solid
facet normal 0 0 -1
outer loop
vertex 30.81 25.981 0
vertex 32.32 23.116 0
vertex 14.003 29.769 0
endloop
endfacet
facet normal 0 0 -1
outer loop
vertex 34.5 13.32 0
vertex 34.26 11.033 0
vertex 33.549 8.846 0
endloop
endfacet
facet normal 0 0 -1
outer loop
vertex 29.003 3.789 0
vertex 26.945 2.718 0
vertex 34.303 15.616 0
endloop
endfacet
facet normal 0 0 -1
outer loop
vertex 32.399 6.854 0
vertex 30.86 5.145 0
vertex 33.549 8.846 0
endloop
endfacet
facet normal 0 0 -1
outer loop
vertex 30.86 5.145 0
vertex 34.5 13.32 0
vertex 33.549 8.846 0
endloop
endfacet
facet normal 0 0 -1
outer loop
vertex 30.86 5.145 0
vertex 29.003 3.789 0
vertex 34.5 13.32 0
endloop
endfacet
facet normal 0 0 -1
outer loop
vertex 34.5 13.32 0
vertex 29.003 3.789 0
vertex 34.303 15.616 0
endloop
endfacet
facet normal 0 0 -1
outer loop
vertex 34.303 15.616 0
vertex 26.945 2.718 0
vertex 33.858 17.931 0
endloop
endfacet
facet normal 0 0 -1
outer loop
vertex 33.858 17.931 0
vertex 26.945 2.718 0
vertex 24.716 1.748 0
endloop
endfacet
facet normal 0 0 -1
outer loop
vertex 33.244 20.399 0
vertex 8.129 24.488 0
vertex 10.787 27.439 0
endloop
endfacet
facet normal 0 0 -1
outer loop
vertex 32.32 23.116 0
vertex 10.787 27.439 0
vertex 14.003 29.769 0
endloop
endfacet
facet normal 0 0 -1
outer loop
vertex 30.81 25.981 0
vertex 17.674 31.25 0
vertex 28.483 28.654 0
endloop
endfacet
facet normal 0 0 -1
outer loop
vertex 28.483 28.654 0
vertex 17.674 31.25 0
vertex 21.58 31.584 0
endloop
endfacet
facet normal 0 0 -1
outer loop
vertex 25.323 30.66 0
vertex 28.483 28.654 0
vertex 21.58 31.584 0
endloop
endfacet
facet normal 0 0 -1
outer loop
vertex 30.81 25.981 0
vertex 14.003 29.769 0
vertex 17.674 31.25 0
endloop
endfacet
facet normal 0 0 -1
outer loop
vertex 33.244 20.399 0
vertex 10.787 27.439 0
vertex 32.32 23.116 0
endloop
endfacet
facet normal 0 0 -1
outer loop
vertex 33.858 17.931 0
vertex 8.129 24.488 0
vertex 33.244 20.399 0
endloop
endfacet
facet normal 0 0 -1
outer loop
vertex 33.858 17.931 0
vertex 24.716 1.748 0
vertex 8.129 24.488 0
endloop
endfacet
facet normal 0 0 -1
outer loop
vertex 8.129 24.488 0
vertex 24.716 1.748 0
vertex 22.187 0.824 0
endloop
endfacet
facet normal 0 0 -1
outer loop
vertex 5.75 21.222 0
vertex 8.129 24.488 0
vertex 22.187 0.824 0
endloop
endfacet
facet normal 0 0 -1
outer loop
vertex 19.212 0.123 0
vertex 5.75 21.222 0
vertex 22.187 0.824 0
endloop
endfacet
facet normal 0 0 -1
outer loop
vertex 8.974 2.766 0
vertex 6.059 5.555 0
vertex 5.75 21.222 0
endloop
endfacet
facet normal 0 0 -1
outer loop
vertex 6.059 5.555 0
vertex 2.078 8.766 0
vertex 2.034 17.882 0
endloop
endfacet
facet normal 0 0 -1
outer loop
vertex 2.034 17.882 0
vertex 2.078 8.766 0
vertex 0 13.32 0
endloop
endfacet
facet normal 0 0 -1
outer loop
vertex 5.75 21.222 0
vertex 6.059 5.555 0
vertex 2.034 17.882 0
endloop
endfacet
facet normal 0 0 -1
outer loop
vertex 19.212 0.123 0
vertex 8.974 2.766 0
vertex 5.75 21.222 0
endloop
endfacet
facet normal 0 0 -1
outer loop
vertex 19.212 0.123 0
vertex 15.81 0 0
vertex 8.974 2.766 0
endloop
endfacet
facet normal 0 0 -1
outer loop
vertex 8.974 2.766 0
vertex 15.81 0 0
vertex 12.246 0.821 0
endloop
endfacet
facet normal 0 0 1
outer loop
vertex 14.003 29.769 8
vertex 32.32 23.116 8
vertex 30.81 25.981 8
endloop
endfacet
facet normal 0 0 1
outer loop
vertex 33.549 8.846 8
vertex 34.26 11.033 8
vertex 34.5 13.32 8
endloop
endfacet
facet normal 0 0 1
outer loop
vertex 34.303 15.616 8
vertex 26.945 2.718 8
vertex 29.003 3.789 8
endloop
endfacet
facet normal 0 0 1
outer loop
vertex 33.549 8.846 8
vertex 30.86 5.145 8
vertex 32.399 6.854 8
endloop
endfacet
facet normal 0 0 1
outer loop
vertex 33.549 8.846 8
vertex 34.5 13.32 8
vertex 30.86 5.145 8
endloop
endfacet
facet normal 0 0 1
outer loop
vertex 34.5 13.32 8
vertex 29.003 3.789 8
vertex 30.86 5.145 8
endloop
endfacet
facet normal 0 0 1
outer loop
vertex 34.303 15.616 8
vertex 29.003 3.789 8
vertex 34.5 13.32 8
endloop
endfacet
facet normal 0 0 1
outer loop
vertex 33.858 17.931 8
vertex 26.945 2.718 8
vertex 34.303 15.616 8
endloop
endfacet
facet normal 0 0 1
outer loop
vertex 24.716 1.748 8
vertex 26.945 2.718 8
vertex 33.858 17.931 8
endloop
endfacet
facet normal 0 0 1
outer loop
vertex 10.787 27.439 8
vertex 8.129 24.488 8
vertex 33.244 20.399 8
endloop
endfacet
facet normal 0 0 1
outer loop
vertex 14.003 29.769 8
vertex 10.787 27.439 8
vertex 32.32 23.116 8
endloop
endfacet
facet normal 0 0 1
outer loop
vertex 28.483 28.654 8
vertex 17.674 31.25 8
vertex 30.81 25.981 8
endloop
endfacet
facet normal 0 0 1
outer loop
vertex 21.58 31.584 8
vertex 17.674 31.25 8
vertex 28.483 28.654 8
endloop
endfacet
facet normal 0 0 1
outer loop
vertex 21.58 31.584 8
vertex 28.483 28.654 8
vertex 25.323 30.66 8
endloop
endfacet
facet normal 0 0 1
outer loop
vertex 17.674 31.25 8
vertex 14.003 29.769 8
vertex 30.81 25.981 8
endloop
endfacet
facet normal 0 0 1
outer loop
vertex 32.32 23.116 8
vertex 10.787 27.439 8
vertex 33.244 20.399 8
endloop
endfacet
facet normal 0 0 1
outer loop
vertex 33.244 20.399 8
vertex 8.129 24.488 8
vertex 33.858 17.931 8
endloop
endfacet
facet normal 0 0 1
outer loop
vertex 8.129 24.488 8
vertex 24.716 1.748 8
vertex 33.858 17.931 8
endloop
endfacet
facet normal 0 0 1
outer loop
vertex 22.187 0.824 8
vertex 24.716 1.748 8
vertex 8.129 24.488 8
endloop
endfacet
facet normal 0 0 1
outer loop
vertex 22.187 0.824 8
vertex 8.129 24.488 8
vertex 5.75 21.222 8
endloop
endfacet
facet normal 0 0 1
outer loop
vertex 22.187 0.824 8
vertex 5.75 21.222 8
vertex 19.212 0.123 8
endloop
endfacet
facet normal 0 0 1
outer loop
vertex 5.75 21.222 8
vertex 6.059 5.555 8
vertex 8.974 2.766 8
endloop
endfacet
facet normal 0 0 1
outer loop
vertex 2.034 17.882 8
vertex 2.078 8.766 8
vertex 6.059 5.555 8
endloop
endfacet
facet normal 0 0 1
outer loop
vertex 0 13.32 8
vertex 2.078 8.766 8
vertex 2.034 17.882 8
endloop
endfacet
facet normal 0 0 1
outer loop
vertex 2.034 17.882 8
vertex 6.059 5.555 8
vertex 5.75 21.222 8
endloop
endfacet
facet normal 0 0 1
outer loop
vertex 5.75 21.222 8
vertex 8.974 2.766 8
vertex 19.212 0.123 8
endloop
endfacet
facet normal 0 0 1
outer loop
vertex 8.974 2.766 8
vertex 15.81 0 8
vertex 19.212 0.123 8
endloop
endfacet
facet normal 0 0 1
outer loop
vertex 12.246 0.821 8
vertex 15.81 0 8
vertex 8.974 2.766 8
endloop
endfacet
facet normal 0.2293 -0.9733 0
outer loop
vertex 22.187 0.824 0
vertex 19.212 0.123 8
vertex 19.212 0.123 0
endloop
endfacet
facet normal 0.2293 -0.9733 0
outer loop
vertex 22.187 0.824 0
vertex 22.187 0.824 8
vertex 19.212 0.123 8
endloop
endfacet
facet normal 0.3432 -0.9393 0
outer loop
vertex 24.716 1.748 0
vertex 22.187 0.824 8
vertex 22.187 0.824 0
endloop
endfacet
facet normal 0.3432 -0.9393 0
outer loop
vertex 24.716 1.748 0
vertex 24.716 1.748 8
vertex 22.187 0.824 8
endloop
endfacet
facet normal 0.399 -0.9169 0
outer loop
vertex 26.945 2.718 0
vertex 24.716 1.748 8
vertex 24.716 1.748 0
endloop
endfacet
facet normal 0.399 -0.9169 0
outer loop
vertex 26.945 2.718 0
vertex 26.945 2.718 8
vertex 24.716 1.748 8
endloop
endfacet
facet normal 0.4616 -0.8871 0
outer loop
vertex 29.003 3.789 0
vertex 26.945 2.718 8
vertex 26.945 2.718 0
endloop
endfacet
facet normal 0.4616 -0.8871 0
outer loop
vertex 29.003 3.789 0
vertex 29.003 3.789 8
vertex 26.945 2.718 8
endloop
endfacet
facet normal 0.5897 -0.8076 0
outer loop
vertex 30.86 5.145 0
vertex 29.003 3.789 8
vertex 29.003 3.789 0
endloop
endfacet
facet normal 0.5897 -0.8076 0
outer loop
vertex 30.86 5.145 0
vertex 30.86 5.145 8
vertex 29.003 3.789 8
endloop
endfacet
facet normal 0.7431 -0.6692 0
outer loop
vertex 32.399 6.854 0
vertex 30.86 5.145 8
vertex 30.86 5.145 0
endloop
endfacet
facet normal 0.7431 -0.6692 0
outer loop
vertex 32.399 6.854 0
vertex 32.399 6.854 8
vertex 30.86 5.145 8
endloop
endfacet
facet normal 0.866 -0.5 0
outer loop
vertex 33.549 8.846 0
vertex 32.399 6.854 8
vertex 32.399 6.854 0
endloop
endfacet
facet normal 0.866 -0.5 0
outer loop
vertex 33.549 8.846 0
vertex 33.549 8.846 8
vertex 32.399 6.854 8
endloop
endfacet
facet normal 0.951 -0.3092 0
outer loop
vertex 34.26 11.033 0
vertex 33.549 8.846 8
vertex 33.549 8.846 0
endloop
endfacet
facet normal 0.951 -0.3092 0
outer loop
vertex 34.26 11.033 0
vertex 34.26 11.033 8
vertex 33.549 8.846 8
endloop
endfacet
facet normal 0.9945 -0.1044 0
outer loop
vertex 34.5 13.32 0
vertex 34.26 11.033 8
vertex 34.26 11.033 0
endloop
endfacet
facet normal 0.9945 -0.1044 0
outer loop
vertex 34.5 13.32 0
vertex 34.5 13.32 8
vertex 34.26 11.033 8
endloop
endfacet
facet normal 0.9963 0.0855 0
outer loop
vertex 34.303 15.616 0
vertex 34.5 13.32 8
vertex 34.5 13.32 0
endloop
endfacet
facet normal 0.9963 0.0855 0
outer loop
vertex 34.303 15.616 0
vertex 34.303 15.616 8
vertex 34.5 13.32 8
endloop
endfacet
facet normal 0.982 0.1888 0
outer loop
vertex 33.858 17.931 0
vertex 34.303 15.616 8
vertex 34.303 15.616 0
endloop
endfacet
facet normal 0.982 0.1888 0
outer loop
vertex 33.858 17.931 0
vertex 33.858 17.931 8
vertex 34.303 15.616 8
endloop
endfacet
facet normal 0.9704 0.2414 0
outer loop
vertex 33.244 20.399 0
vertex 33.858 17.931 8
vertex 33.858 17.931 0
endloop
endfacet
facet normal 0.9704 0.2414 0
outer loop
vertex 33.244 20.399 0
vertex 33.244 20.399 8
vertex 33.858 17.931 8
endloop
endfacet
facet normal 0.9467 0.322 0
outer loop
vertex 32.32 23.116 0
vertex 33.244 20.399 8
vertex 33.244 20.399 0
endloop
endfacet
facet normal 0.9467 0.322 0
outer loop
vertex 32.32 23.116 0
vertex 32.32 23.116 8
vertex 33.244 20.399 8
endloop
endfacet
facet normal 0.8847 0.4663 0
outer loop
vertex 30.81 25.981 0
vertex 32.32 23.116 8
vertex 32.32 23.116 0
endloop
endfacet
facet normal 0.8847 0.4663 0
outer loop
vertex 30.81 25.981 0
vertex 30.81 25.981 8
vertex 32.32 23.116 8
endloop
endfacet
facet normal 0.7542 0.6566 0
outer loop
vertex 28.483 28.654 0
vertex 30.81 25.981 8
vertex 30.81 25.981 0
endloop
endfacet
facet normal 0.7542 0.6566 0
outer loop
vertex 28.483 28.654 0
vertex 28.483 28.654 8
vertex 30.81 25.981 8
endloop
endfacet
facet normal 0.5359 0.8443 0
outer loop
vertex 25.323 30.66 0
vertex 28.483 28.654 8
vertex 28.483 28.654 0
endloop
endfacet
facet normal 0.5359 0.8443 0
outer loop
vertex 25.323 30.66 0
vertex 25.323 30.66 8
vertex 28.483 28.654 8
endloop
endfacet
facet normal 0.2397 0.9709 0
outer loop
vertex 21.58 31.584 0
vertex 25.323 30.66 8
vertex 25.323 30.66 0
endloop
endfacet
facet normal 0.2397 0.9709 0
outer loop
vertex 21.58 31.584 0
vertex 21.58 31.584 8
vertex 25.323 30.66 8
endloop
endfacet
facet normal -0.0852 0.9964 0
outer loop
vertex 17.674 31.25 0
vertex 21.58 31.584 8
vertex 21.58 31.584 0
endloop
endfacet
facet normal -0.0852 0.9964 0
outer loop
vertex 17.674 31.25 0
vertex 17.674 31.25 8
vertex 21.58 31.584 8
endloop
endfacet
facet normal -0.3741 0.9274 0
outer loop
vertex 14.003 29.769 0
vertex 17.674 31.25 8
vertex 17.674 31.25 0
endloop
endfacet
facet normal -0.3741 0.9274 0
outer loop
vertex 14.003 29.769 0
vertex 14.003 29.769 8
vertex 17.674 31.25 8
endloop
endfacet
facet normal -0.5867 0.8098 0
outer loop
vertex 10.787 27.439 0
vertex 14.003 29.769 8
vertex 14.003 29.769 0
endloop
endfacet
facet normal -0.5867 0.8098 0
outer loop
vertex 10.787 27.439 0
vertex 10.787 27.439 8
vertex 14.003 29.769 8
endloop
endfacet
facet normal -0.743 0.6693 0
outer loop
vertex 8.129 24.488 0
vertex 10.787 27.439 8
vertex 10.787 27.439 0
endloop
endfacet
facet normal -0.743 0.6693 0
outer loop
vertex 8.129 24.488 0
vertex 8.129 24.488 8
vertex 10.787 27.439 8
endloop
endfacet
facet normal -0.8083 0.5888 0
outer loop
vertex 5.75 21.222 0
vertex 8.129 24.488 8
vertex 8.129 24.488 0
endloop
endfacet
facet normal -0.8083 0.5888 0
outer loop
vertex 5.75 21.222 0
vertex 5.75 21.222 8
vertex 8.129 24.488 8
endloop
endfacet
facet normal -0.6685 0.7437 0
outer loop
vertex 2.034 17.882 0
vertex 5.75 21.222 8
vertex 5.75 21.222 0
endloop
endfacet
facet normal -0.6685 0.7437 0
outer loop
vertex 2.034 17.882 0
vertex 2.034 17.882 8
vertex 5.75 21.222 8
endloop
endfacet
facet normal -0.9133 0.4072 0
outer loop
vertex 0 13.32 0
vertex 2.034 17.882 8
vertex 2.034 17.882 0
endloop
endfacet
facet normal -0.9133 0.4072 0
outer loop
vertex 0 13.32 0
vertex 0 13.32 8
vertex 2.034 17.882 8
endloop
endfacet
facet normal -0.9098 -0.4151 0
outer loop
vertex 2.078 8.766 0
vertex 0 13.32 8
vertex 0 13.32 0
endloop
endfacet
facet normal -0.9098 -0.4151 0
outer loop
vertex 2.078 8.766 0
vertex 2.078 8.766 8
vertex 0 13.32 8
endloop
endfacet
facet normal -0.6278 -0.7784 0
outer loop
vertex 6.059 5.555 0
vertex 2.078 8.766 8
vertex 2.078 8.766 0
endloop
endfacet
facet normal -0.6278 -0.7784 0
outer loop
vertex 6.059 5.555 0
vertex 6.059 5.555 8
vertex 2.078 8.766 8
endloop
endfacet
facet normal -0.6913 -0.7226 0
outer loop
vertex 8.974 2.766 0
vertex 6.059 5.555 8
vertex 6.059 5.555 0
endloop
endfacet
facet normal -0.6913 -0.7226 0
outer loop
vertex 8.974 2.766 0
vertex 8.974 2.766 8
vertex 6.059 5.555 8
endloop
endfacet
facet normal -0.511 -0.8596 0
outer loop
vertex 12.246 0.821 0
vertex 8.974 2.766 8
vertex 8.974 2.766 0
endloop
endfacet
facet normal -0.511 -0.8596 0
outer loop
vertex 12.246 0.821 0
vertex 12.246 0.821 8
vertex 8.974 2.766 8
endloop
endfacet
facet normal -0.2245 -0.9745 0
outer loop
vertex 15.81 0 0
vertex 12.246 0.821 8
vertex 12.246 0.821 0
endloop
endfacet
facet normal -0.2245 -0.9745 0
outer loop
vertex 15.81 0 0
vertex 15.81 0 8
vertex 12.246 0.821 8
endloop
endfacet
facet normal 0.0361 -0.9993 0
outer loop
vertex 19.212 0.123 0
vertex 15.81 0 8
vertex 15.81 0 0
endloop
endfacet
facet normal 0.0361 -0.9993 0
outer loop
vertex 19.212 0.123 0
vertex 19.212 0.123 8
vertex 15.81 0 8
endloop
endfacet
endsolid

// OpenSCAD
$fn = 32;

// ----------------------------------------------------------------------
// Cam disc: base radius 11.0 mm, lift 8.0 mm, 30 profile points
// ----------------------------------------------------------------------

// --- parameters (mm) ---
profile_height = 8;       // extrusion height
profile_points = 30;      // points of the closed outline

profile = [[34.5, 13.32], [34.303, 15.616], [33.858, 17.931], [33.244, 20.399], [32.32, 23.116], [30.81, 25.981], [28.483, 28.654], [25.323, 30.66], [21.58, 31.584], [17.674, 31.25], [14.003, 29.769], [10.787, 27.439], [8.129, 24.488], [5.75, 21.222], [2.034, 17.882], [0, 13.32], [2.078, 8.766], [6.059, 5.555], [8.974, 2.766], [12.246, 0.821], [15.81, 0], [19.212, 0.123], [22.187, 0.824], [24.716, 1.748], [26.945, 2.718], [29.003, 3.789], [30.86, 5.145], [32.399, 6.854], [33.549, 8.846], [34.26, 11.033]];  // single closed polygon, 30 points, counter clockwise

// --- the one profile operation ---
linear_extrude(height = profile_height) polygon(points = profile);
